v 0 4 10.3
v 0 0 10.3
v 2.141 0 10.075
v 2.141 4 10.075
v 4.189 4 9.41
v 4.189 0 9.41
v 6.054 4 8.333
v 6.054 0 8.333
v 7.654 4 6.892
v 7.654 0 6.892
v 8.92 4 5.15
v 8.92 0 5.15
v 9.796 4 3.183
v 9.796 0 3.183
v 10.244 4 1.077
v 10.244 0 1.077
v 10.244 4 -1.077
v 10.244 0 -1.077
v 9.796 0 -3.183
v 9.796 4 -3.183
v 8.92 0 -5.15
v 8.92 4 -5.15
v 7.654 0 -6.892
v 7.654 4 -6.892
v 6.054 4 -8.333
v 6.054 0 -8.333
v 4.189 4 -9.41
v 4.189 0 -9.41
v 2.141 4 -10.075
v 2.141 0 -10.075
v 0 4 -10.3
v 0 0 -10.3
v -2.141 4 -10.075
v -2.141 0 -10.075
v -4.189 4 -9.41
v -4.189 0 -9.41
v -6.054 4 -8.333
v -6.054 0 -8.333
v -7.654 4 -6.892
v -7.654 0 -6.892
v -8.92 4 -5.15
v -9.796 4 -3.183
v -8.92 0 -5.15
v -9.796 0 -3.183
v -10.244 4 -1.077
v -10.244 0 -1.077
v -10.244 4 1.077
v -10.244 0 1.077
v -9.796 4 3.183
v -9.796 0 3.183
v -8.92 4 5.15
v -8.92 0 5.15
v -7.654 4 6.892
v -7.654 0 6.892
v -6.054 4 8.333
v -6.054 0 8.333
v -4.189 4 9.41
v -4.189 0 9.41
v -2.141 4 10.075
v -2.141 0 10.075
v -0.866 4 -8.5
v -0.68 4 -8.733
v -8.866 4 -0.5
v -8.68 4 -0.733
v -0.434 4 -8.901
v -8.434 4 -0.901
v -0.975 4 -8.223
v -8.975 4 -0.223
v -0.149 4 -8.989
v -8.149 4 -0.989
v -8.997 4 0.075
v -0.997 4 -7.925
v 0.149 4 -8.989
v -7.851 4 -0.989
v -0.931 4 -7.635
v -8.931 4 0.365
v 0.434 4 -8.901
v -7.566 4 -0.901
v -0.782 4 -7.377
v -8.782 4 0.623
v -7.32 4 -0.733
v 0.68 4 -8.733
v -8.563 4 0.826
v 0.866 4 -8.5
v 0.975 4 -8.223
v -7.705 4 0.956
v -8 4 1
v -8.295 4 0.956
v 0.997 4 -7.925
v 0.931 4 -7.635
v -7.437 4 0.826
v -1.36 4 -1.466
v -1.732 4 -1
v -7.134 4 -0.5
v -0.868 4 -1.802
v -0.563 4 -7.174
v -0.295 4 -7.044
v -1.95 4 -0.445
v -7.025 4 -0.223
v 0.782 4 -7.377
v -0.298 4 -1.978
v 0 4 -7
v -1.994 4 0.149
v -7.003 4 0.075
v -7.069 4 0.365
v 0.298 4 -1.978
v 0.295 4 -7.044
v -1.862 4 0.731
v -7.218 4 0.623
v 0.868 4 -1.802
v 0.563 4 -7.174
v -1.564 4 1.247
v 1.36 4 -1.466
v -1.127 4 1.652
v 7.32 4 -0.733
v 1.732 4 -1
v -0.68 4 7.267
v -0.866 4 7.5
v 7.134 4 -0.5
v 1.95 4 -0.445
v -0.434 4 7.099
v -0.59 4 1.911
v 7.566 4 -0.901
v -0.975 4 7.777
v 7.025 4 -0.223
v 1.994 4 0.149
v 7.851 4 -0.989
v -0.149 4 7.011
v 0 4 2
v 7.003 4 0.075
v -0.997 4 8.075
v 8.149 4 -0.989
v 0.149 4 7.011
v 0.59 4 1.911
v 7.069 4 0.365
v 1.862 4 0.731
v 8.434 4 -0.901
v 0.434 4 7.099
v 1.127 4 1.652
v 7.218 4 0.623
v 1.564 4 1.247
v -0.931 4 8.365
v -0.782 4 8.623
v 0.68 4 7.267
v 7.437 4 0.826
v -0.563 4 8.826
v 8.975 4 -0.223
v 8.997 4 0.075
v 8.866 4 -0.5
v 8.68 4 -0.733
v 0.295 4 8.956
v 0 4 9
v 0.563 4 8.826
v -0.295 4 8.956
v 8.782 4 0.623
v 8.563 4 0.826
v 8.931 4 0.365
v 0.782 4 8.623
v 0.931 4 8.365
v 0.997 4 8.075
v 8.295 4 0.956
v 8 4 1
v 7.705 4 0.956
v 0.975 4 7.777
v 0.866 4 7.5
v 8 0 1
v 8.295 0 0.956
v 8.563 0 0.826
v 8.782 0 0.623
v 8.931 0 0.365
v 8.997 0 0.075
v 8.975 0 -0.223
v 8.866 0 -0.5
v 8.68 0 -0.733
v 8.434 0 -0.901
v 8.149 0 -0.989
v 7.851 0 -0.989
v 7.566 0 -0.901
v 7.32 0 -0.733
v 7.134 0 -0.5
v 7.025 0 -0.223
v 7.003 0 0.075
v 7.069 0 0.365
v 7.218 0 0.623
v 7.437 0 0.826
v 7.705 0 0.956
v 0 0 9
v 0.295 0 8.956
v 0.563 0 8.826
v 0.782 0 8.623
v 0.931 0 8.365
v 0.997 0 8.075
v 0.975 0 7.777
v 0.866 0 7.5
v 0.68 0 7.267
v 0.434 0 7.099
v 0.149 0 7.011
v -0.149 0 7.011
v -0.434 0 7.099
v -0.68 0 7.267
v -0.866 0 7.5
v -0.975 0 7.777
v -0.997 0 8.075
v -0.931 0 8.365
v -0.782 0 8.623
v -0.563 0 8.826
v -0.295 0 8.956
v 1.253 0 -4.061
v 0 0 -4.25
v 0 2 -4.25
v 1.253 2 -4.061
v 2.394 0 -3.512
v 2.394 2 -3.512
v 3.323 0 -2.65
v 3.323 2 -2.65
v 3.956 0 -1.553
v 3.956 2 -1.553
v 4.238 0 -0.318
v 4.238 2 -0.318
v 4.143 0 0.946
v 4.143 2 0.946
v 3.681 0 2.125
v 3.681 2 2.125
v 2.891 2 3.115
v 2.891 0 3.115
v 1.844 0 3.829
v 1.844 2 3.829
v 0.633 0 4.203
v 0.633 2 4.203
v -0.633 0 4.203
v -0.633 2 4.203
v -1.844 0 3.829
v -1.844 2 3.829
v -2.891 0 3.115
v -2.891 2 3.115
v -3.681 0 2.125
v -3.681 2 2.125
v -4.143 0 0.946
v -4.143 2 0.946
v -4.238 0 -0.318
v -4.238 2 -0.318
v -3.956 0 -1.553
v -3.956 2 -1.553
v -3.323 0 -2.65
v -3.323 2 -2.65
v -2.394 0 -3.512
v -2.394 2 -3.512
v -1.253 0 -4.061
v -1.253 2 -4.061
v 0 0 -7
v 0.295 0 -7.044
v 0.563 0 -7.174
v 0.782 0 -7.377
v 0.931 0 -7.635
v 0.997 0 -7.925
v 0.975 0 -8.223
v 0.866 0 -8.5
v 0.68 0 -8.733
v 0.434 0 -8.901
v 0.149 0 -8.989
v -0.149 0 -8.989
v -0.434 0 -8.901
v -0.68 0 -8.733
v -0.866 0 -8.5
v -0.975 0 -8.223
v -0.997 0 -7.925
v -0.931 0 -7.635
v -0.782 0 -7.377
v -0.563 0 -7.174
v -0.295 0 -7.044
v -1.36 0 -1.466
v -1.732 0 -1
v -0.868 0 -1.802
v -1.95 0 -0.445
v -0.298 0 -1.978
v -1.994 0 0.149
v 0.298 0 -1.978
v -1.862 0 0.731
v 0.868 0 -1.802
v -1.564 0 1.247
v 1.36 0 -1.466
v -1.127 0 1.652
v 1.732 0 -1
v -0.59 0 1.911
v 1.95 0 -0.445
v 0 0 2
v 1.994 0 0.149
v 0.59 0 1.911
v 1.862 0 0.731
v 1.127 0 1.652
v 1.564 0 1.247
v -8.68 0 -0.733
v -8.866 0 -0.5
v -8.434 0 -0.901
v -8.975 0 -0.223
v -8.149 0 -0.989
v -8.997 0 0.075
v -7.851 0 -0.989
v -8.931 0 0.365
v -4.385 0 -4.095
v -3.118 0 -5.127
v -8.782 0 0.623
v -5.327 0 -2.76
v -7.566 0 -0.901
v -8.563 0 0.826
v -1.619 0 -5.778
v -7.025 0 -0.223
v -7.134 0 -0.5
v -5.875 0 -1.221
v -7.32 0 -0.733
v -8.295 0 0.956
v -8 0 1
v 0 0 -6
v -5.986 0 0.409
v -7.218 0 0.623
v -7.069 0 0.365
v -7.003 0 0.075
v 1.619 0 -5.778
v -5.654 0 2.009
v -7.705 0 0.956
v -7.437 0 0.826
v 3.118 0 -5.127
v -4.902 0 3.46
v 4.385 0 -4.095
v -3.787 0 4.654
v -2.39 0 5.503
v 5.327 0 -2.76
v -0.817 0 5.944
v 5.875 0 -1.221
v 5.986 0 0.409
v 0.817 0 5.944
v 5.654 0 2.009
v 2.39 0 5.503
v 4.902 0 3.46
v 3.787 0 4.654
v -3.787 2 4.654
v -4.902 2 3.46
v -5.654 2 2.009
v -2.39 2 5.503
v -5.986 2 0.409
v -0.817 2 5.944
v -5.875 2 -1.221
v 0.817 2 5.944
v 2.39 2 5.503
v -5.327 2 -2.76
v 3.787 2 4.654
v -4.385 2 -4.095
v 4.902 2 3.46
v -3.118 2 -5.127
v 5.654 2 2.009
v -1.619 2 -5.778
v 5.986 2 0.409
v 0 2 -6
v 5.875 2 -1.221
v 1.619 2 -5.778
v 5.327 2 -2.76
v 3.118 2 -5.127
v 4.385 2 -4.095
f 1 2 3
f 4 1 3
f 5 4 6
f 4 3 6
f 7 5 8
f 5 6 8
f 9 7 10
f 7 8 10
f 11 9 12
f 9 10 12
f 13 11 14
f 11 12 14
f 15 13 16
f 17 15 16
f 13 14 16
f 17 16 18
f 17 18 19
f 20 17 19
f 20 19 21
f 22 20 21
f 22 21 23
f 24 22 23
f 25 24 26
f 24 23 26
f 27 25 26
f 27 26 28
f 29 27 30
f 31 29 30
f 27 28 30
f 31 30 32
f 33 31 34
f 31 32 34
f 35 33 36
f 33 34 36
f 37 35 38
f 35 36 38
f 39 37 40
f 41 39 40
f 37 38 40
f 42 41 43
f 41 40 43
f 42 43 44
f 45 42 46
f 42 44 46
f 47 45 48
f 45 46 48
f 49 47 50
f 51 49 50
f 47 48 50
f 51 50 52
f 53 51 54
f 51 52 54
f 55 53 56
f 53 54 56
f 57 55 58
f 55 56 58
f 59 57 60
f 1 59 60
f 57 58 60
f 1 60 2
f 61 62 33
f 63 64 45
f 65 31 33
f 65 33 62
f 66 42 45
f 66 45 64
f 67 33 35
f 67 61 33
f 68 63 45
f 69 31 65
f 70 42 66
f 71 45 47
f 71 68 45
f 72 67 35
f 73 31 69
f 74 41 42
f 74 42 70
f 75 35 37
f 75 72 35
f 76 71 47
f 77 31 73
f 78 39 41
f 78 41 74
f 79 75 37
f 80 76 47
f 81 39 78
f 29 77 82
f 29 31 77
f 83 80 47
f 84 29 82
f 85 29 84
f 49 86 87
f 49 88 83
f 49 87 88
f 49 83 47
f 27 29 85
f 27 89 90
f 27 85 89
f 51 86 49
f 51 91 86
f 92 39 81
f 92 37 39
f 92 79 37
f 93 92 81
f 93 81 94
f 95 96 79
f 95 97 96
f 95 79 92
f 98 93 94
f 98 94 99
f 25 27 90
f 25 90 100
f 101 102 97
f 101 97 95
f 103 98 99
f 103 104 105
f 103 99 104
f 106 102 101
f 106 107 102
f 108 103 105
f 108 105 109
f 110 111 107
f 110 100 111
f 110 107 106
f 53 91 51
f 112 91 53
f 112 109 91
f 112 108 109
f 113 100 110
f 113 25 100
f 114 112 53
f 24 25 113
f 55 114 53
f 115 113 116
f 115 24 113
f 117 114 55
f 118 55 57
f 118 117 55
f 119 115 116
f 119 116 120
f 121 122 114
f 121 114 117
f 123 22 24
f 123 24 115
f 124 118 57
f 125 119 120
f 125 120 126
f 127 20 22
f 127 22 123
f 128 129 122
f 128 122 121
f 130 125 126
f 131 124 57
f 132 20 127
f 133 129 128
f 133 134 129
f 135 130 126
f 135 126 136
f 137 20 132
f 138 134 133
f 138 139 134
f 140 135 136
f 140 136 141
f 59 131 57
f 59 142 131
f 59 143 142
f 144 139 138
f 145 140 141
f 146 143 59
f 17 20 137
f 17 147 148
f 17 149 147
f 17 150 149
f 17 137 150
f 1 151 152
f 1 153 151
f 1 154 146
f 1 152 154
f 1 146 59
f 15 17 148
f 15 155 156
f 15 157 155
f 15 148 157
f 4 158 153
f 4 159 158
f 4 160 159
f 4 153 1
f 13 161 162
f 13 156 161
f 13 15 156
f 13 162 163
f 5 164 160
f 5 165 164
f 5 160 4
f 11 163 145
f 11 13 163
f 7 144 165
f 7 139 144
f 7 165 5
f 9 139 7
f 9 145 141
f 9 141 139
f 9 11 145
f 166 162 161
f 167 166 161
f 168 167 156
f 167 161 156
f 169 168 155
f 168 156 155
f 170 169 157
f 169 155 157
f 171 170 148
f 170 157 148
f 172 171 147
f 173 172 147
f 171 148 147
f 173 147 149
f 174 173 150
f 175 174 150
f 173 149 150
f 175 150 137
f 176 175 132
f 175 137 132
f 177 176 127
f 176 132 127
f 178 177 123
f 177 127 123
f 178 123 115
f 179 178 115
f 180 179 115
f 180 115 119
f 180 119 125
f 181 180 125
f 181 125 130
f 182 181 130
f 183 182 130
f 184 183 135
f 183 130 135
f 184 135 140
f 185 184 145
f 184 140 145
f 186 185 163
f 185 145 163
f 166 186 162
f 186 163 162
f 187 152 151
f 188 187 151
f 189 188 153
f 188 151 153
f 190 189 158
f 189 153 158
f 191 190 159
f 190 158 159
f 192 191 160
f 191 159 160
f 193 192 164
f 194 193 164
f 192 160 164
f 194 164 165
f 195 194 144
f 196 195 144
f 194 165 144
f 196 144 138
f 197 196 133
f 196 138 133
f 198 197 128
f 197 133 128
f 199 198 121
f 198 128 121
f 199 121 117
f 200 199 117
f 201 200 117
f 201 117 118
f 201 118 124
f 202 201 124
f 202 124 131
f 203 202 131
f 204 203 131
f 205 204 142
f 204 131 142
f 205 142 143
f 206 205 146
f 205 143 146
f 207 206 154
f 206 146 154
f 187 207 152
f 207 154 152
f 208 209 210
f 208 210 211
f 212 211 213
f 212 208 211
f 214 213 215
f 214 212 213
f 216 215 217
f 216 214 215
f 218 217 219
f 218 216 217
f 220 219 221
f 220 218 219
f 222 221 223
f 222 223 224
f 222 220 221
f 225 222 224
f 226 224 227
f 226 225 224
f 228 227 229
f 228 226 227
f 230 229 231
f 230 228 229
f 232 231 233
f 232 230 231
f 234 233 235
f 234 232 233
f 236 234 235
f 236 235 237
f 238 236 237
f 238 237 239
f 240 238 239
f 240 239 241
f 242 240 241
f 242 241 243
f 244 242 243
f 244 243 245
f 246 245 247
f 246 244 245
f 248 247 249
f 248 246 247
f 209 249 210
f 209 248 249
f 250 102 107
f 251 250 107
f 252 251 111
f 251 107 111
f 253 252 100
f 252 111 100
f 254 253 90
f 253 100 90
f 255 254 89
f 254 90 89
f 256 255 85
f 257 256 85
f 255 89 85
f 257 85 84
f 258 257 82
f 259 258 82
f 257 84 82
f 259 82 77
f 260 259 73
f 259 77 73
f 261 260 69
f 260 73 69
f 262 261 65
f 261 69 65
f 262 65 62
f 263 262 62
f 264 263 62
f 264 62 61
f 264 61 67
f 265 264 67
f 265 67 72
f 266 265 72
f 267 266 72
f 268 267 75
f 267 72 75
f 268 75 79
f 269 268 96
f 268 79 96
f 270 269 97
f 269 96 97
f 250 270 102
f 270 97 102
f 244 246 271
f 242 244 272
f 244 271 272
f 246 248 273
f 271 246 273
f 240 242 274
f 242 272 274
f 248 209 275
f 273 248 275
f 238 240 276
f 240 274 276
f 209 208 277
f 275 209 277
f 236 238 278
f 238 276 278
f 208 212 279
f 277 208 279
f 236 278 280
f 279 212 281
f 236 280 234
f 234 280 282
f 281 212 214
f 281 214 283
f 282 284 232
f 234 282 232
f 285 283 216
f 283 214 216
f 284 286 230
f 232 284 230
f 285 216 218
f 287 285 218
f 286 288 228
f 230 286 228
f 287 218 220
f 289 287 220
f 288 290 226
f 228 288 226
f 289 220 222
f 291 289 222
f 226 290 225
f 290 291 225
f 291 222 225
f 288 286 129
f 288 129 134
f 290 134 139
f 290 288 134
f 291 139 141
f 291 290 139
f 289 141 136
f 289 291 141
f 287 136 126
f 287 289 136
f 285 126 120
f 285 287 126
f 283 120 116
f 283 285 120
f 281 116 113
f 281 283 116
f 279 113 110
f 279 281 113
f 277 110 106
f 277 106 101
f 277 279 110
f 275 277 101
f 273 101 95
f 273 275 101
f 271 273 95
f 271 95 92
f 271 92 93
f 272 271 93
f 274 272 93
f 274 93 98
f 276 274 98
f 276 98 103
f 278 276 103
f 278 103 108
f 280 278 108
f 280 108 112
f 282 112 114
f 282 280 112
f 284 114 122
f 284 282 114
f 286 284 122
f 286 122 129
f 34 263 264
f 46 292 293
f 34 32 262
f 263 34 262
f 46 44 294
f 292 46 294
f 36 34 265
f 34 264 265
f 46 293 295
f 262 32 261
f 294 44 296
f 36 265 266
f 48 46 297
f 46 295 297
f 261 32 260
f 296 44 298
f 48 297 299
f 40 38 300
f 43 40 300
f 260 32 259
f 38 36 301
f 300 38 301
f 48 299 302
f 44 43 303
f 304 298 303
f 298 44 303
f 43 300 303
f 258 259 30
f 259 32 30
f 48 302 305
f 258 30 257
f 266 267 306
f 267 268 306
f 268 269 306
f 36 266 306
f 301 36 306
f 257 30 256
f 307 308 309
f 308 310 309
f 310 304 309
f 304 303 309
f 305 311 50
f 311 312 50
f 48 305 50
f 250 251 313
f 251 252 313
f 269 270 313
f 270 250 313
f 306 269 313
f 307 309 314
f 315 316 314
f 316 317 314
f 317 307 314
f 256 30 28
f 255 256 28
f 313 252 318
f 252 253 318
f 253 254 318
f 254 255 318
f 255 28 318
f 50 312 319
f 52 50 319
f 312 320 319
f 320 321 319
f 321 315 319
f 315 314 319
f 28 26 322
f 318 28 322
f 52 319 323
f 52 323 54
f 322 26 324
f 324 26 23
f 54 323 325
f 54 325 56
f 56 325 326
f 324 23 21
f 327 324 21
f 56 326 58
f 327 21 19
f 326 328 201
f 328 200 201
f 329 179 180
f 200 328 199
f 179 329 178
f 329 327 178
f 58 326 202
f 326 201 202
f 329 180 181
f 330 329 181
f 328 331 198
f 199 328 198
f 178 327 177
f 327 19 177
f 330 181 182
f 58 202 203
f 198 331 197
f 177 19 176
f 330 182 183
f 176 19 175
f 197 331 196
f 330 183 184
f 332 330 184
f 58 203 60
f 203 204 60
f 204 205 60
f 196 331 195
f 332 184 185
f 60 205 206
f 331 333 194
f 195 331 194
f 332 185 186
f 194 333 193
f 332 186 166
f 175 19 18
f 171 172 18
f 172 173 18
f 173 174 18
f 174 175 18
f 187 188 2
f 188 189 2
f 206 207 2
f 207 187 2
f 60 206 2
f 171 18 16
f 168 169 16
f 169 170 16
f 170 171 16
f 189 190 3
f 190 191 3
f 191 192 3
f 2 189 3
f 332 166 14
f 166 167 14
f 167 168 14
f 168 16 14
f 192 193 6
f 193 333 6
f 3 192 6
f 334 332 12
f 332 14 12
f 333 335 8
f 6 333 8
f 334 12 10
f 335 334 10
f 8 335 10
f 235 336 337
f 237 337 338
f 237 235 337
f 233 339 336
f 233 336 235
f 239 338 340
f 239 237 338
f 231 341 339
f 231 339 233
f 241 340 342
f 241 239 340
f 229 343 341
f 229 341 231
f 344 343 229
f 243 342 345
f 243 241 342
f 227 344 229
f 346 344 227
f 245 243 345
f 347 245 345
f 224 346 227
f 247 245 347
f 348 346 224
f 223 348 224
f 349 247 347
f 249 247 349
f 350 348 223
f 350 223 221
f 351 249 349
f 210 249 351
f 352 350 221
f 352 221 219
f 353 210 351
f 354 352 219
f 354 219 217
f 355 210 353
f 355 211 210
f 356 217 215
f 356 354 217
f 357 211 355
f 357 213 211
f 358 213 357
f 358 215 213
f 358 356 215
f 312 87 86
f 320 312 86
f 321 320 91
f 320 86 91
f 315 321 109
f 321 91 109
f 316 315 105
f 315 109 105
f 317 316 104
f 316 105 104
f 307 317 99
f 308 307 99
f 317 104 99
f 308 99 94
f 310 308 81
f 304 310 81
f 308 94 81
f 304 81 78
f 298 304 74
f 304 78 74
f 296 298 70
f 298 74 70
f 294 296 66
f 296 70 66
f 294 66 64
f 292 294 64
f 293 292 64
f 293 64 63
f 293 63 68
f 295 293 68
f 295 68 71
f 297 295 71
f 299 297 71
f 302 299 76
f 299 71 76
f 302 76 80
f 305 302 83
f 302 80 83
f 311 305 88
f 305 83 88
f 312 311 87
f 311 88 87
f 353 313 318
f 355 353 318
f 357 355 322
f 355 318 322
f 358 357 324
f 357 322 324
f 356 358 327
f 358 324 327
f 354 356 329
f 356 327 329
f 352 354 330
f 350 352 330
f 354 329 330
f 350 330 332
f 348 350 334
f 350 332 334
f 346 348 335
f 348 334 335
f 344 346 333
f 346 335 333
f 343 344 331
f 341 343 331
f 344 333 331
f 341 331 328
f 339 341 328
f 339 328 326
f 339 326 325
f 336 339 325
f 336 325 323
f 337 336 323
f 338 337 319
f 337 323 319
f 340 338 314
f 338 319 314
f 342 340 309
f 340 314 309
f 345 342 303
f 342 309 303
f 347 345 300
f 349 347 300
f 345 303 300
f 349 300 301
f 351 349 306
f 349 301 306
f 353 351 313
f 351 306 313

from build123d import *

# Parameters (mm, degrees)
SKETCH1_R           = 10.3
SKETCH1_R_2         = 2
BOSS_EXTRUDE1_DEPTH = 4
SKETCH2_R           = 1
CUT_EXTRUDE1_DEPTH  = 4
SKETCH3_R           = 6
SKETCH3_R_2         = 4.25
CUT_EXTRUDE2_DEPTH  = 2


with BuildPart() as part:
    # Sketch1 → Boss-Extrude1 (new body)
    with BuildSketch(Plane(origin=(0, 0, 0), x_dir=(1, 0, 0), z_dir=(0, 1, 0))):
        with Locations(Location((0, 0, 0), (0, 0, 270))):
            Circle(SKETCH1_R)
        with Locations(Location((0, 0, 0), (0, 0, 270))):
            Circle(SKETCH1_R_2, mode=Mode.SUBTRACT)
    extrude(amount=BOSS_EXTRUDE1_DEPTH)

    # Sketch2 → Cut-Extrude1 (cut)
    with BuildSketch(Plane(origin=(0, 4, 0), x_dir=(-1, 0, 0), z_dir=(0, 1, 0))):
        with Locations(Location((0, -8, 0), (0, 0, 90))):
            Circle(SKETCH2_R)
        with Locations(Location((8, 0, 0), (0, 0, 90))):
            Circle(SKETCH2_R)
        with Locations(Location((-8, 0, 0), (0, 0, 90))):
            Circle(SKETCH2_R)
        with Locations(Location((0, 8, 0), (0, 0, 90))):
            Circle(SKETCH2_R)
    extrude(amount=-CUT_EXTRUDE1_DEPTH, mode=Mode.SUBTRACT)

    # Sketch3 → Cut-Extrude2 (cut)
    with BuildSketch(Plane.XZ):
        with Locations(Location((0, 0, 0), (0, 0, 270))):
            Circle(SKETCH3_R)
        with Locations(Location((0, 0, 0), (0, 0, 270))):
            Circle(SKETCH3_R_2, mode=Mode.SUBTRACT)
    extrude(amount=-CUT_EXTRUDE2_DEPTH, mode=Mode.SUBTRACT)


solid = part.part
